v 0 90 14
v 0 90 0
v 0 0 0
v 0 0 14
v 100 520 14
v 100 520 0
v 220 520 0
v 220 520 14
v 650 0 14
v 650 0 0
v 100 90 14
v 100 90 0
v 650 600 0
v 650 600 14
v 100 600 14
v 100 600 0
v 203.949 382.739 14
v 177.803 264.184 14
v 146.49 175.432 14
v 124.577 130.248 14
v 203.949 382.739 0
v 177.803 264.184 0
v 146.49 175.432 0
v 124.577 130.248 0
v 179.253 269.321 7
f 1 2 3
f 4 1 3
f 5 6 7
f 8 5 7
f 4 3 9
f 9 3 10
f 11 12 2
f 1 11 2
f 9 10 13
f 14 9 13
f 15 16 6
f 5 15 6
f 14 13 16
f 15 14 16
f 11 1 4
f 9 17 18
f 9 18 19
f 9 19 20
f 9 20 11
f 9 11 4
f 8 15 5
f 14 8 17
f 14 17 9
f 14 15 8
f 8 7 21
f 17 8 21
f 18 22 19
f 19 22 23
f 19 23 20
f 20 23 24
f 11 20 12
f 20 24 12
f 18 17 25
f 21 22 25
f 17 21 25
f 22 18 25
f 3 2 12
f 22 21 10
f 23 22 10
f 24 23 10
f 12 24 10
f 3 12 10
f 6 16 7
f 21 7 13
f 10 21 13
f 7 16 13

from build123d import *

# Parameters (mm, degrees)
PAD_DEPTH = 14


with BuildPart() as part:
    # Sketch → Pad (new body)
    with BuildSketch(Plane.XY):
        with BuildLine():
            Line((0, 0), (650, 0))
            Line((650, 0), (650, 600))
            Line((650, 600), (100, 600))
            Line((100, 600), (100, 520))
            Line((100, 520), (220, 520))
            add(Edge.make_bspline(
                [(220, 520), (198.506592, 233.641052), (100, 90)],
                knots=[0, 0, 0, 1, 1, 1], degree=2))
            Line((100, 90), (0, 90))
            Line((0, 90), (0, 0))
        make_face()
    extrude(amount=PAD_DEPTH)


solid = part.part
